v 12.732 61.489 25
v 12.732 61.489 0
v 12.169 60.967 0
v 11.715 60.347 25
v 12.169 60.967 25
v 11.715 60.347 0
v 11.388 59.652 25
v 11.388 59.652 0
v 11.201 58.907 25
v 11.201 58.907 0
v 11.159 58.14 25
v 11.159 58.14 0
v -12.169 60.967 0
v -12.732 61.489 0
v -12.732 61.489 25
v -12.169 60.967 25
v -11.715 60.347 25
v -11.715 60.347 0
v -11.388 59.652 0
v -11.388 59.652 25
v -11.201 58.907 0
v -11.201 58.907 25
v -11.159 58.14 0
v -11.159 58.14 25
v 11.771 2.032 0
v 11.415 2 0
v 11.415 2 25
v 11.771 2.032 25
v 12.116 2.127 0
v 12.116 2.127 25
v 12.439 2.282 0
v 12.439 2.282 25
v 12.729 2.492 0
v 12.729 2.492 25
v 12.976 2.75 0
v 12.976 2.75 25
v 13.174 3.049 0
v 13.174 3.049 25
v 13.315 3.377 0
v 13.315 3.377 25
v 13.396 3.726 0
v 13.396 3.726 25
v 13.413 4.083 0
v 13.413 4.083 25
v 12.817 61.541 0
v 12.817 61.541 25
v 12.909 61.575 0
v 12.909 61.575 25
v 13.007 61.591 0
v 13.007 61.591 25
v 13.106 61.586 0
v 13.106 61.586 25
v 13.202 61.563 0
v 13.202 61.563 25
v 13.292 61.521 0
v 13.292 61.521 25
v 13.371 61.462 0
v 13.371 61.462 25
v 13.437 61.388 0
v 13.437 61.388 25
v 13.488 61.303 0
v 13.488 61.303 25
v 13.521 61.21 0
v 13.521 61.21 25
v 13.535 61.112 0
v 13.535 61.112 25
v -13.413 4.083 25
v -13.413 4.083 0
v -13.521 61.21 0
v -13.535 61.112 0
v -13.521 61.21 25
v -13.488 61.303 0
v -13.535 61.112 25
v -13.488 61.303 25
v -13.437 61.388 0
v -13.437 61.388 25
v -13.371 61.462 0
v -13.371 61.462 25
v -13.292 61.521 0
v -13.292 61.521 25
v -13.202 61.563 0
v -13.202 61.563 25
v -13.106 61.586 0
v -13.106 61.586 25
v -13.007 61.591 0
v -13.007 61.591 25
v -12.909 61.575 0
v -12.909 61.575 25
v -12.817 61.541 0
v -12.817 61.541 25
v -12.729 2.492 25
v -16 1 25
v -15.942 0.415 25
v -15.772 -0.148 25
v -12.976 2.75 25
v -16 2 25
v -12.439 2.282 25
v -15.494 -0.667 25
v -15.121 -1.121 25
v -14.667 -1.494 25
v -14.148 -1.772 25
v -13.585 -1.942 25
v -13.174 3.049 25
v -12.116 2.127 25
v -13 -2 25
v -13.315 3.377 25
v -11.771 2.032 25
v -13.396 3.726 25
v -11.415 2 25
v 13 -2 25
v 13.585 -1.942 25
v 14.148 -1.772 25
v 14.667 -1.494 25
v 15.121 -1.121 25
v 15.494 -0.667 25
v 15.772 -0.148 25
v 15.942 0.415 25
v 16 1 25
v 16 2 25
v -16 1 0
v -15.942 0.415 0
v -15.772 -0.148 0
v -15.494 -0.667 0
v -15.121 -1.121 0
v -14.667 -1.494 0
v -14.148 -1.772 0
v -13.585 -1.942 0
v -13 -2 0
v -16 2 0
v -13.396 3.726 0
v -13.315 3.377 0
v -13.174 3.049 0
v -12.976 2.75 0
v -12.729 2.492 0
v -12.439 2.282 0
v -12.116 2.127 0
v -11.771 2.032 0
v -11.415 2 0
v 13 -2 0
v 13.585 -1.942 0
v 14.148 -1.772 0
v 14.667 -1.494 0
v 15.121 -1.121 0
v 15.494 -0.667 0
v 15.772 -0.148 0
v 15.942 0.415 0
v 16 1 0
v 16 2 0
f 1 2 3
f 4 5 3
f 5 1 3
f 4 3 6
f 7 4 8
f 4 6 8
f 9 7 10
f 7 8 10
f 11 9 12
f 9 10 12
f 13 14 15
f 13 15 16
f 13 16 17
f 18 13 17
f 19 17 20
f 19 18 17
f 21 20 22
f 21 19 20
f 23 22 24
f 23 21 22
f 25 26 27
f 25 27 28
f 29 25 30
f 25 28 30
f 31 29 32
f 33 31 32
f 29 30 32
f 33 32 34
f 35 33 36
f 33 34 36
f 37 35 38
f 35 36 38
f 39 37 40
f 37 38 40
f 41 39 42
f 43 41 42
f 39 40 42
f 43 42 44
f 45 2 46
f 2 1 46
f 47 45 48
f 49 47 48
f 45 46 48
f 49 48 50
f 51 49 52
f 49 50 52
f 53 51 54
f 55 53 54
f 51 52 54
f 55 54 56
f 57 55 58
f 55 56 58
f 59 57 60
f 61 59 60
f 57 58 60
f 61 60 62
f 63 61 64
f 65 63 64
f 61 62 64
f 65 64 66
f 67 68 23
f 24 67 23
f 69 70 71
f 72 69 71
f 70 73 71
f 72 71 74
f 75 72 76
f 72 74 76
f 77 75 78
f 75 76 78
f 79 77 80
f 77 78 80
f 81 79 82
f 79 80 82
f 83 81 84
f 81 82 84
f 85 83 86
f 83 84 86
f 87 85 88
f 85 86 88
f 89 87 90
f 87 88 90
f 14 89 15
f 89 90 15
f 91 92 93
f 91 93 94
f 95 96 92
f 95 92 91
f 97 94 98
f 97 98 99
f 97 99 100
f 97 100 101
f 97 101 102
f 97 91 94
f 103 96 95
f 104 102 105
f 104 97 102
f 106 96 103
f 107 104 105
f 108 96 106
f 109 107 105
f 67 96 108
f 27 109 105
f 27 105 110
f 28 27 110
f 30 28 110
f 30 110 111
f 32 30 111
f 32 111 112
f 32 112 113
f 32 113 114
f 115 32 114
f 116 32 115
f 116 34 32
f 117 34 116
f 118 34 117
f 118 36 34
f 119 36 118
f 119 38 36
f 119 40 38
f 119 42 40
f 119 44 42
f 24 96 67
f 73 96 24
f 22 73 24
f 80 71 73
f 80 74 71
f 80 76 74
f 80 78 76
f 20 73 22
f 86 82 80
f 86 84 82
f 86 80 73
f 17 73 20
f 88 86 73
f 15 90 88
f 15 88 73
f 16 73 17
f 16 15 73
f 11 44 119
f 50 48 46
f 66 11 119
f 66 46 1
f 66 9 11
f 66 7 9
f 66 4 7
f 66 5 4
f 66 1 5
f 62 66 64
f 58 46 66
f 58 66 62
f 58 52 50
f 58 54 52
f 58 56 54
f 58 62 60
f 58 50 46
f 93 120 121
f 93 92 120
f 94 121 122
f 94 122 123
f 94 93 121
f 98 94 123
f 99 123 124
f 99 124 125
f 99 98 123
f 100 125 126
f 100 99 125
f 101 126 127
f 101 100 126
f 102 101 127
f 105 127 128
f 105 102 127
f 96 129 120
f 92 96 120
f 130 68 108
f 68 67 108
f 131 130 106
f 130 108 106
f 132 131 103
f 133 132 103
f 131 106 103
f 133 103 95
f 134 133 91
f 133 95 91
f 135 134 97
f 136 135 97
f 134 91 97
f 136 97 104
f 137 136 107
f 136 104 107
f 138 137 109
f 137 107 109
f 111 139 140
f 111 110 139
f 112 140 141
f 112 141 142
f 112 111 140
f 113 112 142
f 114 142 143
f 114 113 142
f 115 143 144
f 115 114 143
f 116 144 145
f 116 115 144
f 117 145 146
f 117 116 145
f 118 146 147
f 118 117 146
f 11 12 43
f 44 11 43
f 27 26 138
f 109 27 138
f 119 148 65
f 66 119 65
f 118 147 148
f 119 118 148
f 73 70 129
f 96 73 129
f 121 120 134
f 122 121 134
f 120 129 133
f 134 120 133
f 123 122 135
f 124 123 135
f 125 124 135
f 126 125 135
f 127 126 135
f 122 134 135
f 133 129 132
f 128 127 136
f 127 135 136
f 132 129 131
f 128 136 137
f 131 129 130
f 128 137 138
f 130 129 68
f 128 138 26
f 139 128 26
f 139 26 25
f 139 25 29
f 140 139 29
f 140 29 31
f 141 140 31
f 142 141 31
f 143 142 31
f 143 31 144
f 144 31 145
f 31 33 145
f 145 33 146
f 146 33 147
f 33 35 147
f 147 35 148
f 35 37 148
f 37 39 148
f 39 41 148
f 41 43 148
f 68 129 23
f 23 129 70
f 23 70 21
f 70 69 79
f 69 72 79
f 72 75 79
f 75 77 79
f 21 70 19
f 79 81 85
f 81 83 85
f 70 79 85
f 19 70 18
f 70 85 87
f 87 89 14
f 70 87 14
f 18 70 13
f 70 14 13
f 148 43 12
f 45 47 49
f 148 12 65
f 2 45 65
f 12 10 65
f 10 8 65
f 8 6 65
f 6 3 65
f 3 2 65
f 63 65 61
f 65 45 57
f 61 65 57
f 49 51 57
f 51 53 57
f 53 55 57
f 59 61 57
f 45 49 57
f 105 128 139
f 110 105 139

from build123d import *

# Parameters (mm, degrees)
F1_DEPTH    = 25
F2_T1_DEPTH = 44.0569346235
F3_R        = 0.5
F4_R        = 3
F5_R        = 2


# Not quite as in the source:
# - a fillet or chamfer that OpenCascade refuses, or shapes differently, is made with other operations: its cross-section is extruded or revolved along the edge and cut away or added


with BuildPart() as f1:
    # F0 (on Top) → F1 (new body)
    with BuildSketch(Plane.XY):
        Polygon((-13.5, 61.9478940414), (-16, 2), (-13.5, 2), (-11, 61.9478940414), align=None)
        Polygon((13.5, 2), (16, 2), (13.5, 61.9478940414), (11, 61.9478940414), align=None)
        Polygon((-16, -2), (16, -2), (16, 2), (13.5, 2), (-13.5, 2), (-16, 2), align=None)
    extrude(amount=F1_DEPTH)

    # F2: fillet of radius 4 on 2 edges, made by hand

    # F2_s2 → F2_t1 (cut)
    with BuildSketch(Plane.XY.offset(-9.5284673118)):
        with BuildLine():
            ThreePointArc((13.5, 61.9478940414), (11.7478065256, 60.4014195424), (11.1588077885, 58.1398170495))
            Line((11.1588077885, 58.1398170495), (11, 61.9478940414))
            Line((11, 61.9478940414), (13.5, 61.9478940414))
        make_face()
        with BuildLine():
            ThreePointArc((-13.5, 61.9478940414), (-11.7478065256, 60.4014195424), (-11.1588077885, 58.1398170495))
            Line((-11.1588077885, 58.1398170495), (-11, 61.9478940414))
            Line((-11, 61.9478940414), (-13.5, 61.9478940414))
        make_face()
    extrude(amount=F2_T1_DEPTH, mode=Mode.SUBTRACT)

    # F3
    f3_edges = [f1.edges().sort_by_distance(p)[0] for p in [
        (-13.5, 61.947894, 12.5),
        (13.5, 61.947894, 12.5),
    ]]
    fillet(f3_edges, radius=F3_R)

    # F4
    f4_edges = [f1.edges().sort_by_distance(p)[0] for p in [
        (16, -2, 12.5),
        (-16, -2, 12.5),
    ]]
    fillet(f4_edges, radius=F4_R)

    # F5
    f5_edges = [f1.edges().sort_by_distance(p)[0] for p in [
        (-13.5, 2, 12.5),
        (13.5, 2, 12.5),
    ]]
    fillet(f5_edges, radius=F5_R)


solid = f1.part
